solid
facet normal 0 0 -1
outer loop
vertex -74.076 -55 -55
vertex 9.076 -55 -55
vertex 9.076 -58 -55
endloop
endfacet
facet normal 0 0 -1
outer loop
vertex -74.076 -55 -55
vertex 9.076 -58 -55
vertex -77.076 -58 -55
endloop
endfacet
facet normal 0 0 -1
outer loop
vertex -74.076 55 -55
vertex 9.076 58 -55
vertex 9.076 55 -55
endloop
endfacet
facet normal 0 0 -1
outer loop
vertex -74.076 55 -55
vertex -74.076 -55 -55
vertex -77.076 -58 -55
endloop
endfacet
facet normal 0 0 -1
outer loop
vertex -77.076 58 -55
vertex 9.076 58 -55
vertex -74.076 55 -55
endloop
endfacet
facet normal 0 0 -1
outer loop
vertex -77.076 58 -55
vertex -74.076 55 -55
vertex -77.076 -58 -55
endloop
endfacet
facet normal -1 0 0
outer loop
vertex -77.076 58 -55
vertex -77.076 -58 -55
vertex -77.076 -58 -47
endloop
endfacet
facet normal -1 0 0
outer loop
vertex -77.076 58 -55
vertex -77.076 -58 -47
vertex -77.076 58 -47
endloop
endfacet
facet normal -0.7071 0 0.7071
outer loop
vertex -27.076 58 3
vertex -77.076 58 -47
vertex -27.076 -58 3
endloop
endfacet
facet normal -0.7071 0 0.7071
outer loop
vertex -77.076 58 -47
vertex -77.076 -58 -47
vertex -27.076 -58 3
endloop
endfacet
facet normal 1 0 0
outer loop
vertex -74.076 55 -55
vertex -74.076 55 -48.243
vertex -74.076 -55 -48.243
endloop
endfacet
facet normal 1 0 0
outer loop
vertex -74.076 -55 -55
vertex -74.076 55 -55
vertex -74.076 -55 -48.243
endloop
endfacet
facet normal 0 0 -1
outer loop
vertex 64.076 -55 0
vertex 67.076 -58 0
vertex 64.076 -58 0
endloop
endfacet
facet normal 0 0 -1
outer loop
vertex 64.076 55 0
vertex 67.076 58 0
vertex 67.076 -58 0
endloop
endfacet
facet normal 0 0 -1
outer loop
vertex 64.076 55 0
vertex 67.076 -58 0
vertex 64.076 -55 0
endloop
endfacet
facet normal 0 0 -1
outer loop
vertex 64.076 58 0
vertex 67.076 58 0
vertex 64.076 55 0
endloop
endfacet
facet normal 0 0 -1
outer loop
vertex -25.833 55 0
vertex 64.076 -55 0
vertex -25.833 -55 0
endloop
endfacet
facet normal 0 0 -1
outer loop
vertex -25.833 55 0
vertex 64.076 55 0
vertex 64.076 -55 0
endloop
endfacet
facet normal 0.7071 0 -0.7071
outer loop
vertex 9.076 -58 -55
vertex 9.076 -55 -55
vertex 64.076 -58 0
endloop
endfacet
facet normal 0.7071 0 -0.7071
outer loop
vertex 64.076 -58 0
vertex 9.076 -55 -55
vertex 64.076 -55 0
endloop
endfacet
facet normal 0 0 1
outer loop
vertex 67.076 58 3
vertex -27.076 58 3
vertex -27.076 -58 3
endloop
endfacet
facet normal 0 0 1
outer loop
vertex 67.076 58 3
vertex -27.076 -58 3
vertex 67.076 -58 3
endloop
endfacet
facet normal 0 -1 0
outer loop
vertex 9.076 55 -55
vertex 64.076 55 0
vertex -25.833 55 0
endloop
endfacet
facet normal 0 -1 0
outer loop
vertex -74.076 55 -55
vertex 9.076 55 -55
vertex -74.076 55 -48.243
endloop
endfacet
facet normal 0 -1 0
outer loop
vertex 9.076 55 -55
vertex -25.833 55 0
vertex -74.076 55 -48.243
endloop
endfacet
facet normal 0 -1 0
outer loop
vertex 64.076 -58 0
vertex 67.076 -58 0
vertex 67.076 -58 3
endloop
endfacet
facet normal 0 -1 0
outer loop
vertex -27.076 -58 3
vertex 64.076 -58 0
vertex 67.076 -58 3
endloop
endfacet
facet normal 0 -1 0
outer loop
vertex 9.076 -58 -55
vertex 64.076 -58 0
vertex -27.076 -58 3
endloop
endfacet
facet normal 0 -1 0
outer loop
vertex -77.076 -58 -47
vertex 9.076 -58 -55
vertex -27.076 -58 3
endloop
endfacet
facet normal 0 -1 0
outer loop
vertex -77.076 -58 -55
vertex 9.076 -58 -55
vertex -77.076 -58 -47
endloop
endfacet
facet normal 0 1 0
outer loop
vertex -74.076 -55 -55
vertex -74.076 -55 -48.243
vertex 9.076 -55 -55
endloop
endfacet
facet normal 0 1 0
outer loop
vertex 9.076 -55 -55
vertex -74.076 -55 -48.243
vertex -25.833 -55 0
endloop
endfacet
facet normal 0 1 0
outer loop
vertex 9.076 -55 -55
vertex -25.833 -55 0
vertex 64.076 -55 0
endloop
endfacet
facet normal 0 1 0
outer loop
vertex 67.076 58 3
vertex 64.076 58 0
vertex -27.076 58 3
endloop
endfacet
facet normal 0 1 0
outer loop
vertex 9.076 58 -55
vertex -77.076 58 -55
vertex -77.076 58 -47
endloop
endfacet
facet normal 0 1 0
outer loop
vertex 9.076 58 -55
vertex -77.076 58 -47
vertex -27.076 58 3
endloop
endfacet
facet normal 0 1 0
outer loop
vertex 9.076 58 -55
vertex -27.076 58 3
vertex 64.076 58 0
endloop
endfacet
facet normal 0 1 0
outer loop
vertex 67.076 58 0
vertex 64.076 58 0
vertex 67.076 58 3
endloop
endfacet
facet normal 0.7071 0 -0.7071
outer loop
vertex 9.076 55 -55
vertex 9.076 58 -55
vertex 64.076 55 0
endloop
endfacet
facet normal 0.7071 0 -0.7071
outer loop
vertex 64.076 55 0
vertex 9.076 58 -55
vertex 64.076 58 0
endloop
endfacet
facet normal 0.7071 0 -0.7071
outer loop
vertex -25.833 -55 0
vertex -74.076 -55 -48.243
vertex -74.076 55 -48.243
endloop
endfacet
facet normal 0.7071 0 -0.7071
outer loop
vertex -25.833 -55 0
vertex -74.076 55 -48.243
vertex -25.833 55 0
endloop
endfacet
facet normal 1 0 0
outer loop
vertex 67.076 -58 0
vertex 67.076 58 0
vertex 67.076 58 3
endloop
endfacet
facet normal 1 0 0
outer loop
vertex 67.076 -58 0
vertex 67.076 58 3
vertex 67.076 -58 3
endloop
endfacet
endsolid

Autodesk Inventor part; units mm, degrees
ref_plane "YZ Plane" through (0, 0, 0) normal (1, 0, 0) x (0, 1, 0)
ref_plane "XZ Plane" through (0, 0, 0) normal (0, 1, 0) x (-1, 0, 0)
sketch "Эскиз1" plane through (0, 0, 0) normal (0, 0, 1) x (1, 0, 0)
  line L0 (-77.0756, -58) -> (-77.0756, 58) projected
  line L1 (-77.0756, 58) -> (67.0756, 58) projected
  line L2 (67.0756, 58) -> (67.0756, -58) projected
  line L3 (67.0756, -58) -> (-77.0756, -58) projected
  line L4 (-77.0756, -58) -> (-77.0756, 58) projected
  line L5 (9.0756, -58) -> (-77.0756, -58) projected
  line L6 (-77.0756, 58) -> (9.0756, 58) projected
  point P0 (0, 0)
extrude "Выдавливание1" add sketch "Эскиз1" along normal blind 3
sketch "Эскиз2" plane through (0, 0, 0) normal (0, 0, -1) x (-1, 0, 0)
  line L0 (-64.0756, 55) -> (74.0756, 55) projected
  line L1 (74.0756, 55) -> (74.0756, -55) projected
  line L2 (74.0756, -55) -> (-64.0756, -55) projected
  line L3 (-64.0756, -55) -> (-64.0756, 55) projected
  line L4 (77.0756, -58) -> (77.0756, 58) projected
  line L5 (77.0756, 58) -> (-67.0756, 58) projected
  line L6 (-67.0756, 58) -> (-67.0756, -58) projected
  line L7 (-67.0756, -58) -> (77.0756, -58) projected
  line L8 (-67.0756, -58) -> (-67.0756, 58) projected
  line L9 (-67.0756, 58) -> (77.0756, 58) projected
  line L10 (77.0756, 58) -> (77.0756, -58) projected
  line L11 (77.0756, -58) -> (-67.0756, -58) projected
  line L12 (-9.0756, 55) -> (74.0756, 55)
  line L13 (74.0756, 55) -> (74.0756, -55)
  line L14 (74.0756, -55) -> (-9.0756, -55)
  point P0 (0, 0)
  point P1 (68.51, 55)
  point P2 (68.51, -55)
ref_plane "РабПлоскость1" through (-68.51, -58, -55) normal (0, 0, 1) x (1, 0, 0)
extrude "Выдавливание2" add sketch "Эскиз2" along normal up to surface (55 mm away)
chamfer "Фаска1" distance 50 angle 45 1 edges at (-77.0756, 0, 3)
sketch "Эскиз4" plane through (-27.7928, -58, 2.2828) normal (-0.7071068, 0, 0.7071068) x (0.7071068, 0, 0.7071068)
  line L0 (-3.2284, 3) -> (-65.4538, 3) projected
  line L1 (-65.4538, 3) -> (-65.4538, 113) projected
  line L2 (-65.4538, 113) -> (-3.2284, 113) projected
  line L3 (-3.2284, 113) -> (-3.2284, 3) projected
  line L4 (-69.6964, 0) -> (1.0143, 0) projected
  line L5 (1.0143, 0) -> (1.0143, 116) projected
  line L6 (1.0143, 116) -> (-69.6964, 116) projected
  line L7 (-69.6964, 116) -> (-69.6964, 0) projected
  point P0 (18.0383, 58)
extrude "Выдавливание4" add sketch "Эскиз4" against normal blind 3 contours L0 L1 L2 L3 | L7 L6 L5 L4
sketch "Эскиз9" plane through (-28.51, -58, 3) normal (-0.7071068, 0, 0.7071068) x (0.7071068, 0, 0.7071068)
  line L0 (-10, 105.175) -> (-30, 105.175)
  line L1 (-30, 105.175) -> (-30, 91.875)
  line L2 (-30, 91.875) -> (-10, 91.875)
  line L3 (-10, 91.875) -> (-10, 105.175)
  circle A0 centre (-43.2843, 98.525) radius 5.25
  line L4 (-7, 80.55) -> (-33, 80.55)
  line L5 (-33, 80.55) -> (-33, 35.45)
  line L6 (-33, 35.45) -> (-7, 35.45)
  line L7 (-7, 35.45) -> (-7, 80.55)
  line L8 (-33.5, 34.95) -> (-33.5, 81.05)
  line L9 (-33.5, 81.05) -> (-6.5, 81.05)
  line L10 (-6.5, 81.05) -> (-6.5, 34.95)
  line L11 (-6.5, 34.95) -> (-33.5, 34.95)
  line L12 (-6.5, 70.5) -> (-33.5, 70.5)
  line L13 (-33.5, 70.5) -> (-33.5, 45.5)
  line L14 (-33.5, 45.5) -> (-6.5, 45.5)
  line L15 (-6.5, 45.5) -> (-6.5, 70.5)
  line L16 (-6.5, 70.5) -> (-6, 70.5)
  line L17 (-6, 70.5) -> (-6, 45.5)
  line L18 (-6, 45.5) -> (-6.5, 45.5)
  line L19 (-6.5, 45.5) -> (-6.5, 70.5)
  line L20 (-33.5, 70.5) -> (-34, 70.5)
  line L21 (-34, 70.5) -> (-34, 45.5)
  line L22 (-34, 45.5) -> (-33.5, 45.5)
  line L23 (-33.5, 45.5) -> (-33.5, 70.5)
  line L24 (0, 0) -> (0, 116) projected
  line L25 (0, 116) -> (0, 0)
  line L26 (0, 0) -> (0, 58)
  line L27 (0, 58) -> (-56.5685, 58)
  line L28 (-56.5685, 116) -> (-56.5685, 0) projected
  circle A1 centre (-15.7843, 17.475) radius 3.65
  circle A2 centre (-40.7843, 17.475) radius 3.65
  line L29 (-6.5, 34.95) -> (-6.5, 0)
  line L30 (-56.5685, 0) -> (0, 0) projected
  line L31 (-6.5, 17.475) -> (-56.5685, 17.475)
  line L32 (-56.5685, 17.475) -> (0, 17.475)
  line L33 (-15.7843, 17.475) -> (-40.7843, 17.475)
  circle A3 centre (-45.0343, 73.55) radius 4.15
  line L34 (-56.5685, 81.05) -> (-33.5, 81.05)
  line L35 (-33.5, 81.05) -> (-33.5, 34.95)
  line L36 (-33.5, 34.95) -> (-56.5685, 34.95)
  line L37 (-56.5685, 34.95) -> (-56.5685, 81.05)
  line L38 (-45.0343, 81.05) -> (-45.0343, 34.95)
  circle A4 centre (-45.0343, 73.55) radius 7.5
  line L39 (-6.5, 81.05) -> (-6.5, 116)
  line L40 (-6.5, 98.525) -> (-56.5685, 98.525)
  line L41 (-56.5685, 98.525) -> (0, 98.525)
  line L42 (-30, 98.525) -> (-56.5685, 98.525)
  line L43 (-20, 91.875) -> (-20, 0)
  point P0 (18.0383, 58)
  point P1 (-6.5, 58)
  point P2 (-6.5, 58)
  point P3 (-28.2843, 17.475)
  point P4 (-10, 98.525)
  point P5 (-20, 81.05)
  dimension "d31" = 20
  dimension "d32" = 13.3
  dimension "d33" = 10.5
  dimension "d34" = 26
  dimension "d35" = 45.1
  dimension "d36" = 0.5
  dimension "d37" = 25
  dimension "d38" = 0.5
  dimension "d39" = 0.5
  dimension "d40" = 7.3
  dimension "d41" = 7.3
  dimension "d45" = 25
  dimension "d46" = 8.3
  dimension "d47" = 15
  dimension "d48" = 10
sketch "Эскиз10" plane through (-28.51, -58, 3) normal (-0.7071068, 0, 0.7071068) x (0.7071068, 0, 0.7071068)
  line L0 (-30, 105.175) -> (-30, 91.875) projected
  line L1 (-10, 105.175) -> (-30, 105.175) projected
  line L2 (-30, 91.875) -> (-10, 91.875) projected
  line L3 (-10, 91.875) -> (-10, 105.175) projected
  circle A0 centre (-43.2843, 98.525) radius 5.25 projected
  circle A1 centre (-45.0343, 73.55) radius 4.15 projected
  circle A2 centre (-40.7843, 17.475) radius 3.65 projected
  circle A3 centre (-15.7843, 17.475) radius 3.65 projected
  line L4 (-6.5, 34.95) -> (-33.5, 34.95) projected
  line L5 (-33.5, 34.95) -> (-33.5, 81.05) projected
  line L6 (-34, 70.5) -> (-34, 45.5) projected
  line L7 (-33.5, 81.05) -> (-6.5, 81.05) projected
  line L8 (-6.5, 81.05) -> (-6.5, 34.95) projected
  line L9 (-6.5, 70.5) -> (-6, 70.5) projected
  line L10 (-6, 70.5) -> (-6, 45.5) projected
  line L11 (-6, 45.5) -> (-6.5, 45.5) projected
  line L12 (-33.5, 70.5) -> (-34, 70.5) projected
  line L13 (-34, 45.5) -> (-33.5, 45.5) projected
  line L14 (-6.15, 69.35) -> (-6.15, 60.2) projected
  point P0 (18.0383, 58)
extrude "Выдавливание9" [suppressed]
sketch "Эскиз11" plane through (-25.6715, -58, 0.1615) normal (0.7071068, 0, -0.7071068) x (-0.7071068, 0, -0.7071068)
  line L0 (0.2284, 3) -> (0.2284, 113) projected
  line L1 (40.7843, 17.475) -> (40.7843, 25.8116)
  line L2 (38.9594, 25.1915) -> (38.9372, 24.9384) projected
  arc A0 (38.8018, 24.8228) -> (38.9372, 24.9384) centre (38.8107, 24.9495) ccw projected
  arc A1 (38.8018, 24.8228) -> (37.7667, 24.8228) centre (38.2843, 17.475) ccw projected
  arc A2 (38.9594, 25.1915) -> (38.8419, 25.3292) centre (38.8329, 25.2026) ccw projected
  arc A3 (37.6313, 24.9384) -> (37.7667, 24.8228) centre (37.7578, 24.9495) ccw projected
  line L3 (37.6092, 25.1915) -> (37.6313, 24.9384) projected
  arc A4 (37.7267, 25.3292) -> (37.6092, 25.1915) centre (37.7357, 25.2026) ccw projected
  arc A5 (39.3003, 25.2832) -> (37.2683, 25.2832) centre (38.2843, 17.475) ccw projected
  arc A6 (40.1771, 26.0275) -> (39.4118, 25.1305) centre (40.2357, 25.2026) ccw
  line L4 (39.4118, 25.1305) -> (39.434, 24.8774)
  arc A7 (39.434, 24.8774) -> (40.3159, 24.1245) centre (40.2578, 24.9495) ccw
  arc A8 (41.2526, 24.1245) -> (40.3159, 24.1245) centre (40.7843, 17.475) ccw
  arc A9 (41.2526, 24.1245) -> (42.1346, 24.8774) centre (41.3107, 24.9495) ccw
  line L5 (42.1346, 24.8774) -> (42.1567, 25.1305)
  arc A10 (42.1567, 25.1305) -> (41.3914, 26.0275) centre (41.3329, 25.2026) ccw
  circle A11 centre (40.7843, 17.475) radius 8.574
  arc A12 (-9.3529, 50.5788) -> (-10.2349, 51.3317) centre (-10.1768, 50.5067) ccw
  arc A13 (-11.1715, 51.3317) -> (-10.2349, 51.3317) centre (-10.7032, 57.9812) ccw
  arc A14 (-11.1715, 51.3317) -> (-12.0535, 50.5788) centre (-11.2297, 50.5067) ccw
  arc A15 (-12.0756, 50.3258) -> (-11.3104, 49.4288) centre (-11.2518, 50.2537) ccw
  arc A16 (-10.0961, 49.4288) -> (-9.3308, 50.3258) centre (-10.1546, 50.2537) ccw
  line L6 (-9.3308, 50.3258) -> (-9.3529, 50.5788)
  line L7 (-12.0535, 50.5788) -> (-12.0756, 50.3258)
  circle A17 centre (15.7843, 17.475) radius 8.574
  arc A18 (14.4118, 9.8195) -> (15.1771, 8.9225) centre (15.2357, 9.7474) ccw
  arc A19 (15.3159, 10.8255) -> (14.434, 10.0726) centre (15.2578, 10.0005) ccw
  line L8 (14.434, 10.0726) -> (14.4118, 9.8195)
  arc A20 (15.3159, 10.8255) -> (16.2526, 10.8255) centre (15.7843, 17.475) ccw
  arc A21 (17.1346, 10.0726) -> (16.2526, 10.8255) centre (16.3107, 10.0005) ccw
  arc A22 (16.3914, 8.9225) -> (17.1567, 9.8195) centre (16.3329, 9.7474) ccw
  line L9 (17.1567, 9.8195) -> (17.1346, 10.0726)
  line L10 (0.2284, 113) -> (68.4538, 113) projected
  line L11 (68.4538, 3) -> (0.2284, 3) projected
  line L12 (68.4538, 113) -> (68.4538, 3) projected
  point P0 (-18.0383, 58)
  point P1 (40.1771, 26.0275)
  point P2 (15.1771, 8.9225)
  point P3 (16.3914, 8.9225)
  point P4 (15.1771, 8.9225)
  point P5 (16.3914, 8.9225)
  point P6 (17.1346, 10.0726)
extrude "Выдавливание10" [suppressed]
sketch "Эскиз14" plane through (-65.51, -55, -55) normal (1, 0, 0) x (0, 0, -1)
  line L0 (-55, 0) -> (-55, 110) projected
  line L1 (-24.0346, 70.55) -> (-16.7574, 70.55)
  line L2 (-16.7574, 110) -> (-16.7574, 0) projected
  line L3 (-18.0074, 65.55) -> (-15.5074, 65.55)
  line L4 (-15.5074, 65.55) -> (-15.5074, 75.55)
  line L5 (-15.5074, 75.55) -> (-18.0074, 75.55)
  line L6 (-18.0074, 75.55) -> (-18.0074, 65.55)
  line L7 (-18.0074, 65.55) -> (-15.5074, 75.55) construction
  line L8 (-15.5074, 65.55) -> (-18.0074, 75.55) construction
  line L9 (-55, 110) -> (-6.7574, 110) projected
  line L10 (-6.7574, 0) -> (-55, 0) projected
  line L11 (-6.7574, 110) -> (-6.7574, 0) projected
  point P0 (-55, 55)
  dimension "d63" = 2.5
  dimension "d64" = 10
extrude "Выдавливание13" [suppressed]
ref_plane "РабПлоскость2" through (-65.51, 15.55, -39.4926) normal (0, -1, 0) x (1, 0, 0)
sketch "Эскиз15" plane through (-77.0756, 58, -55) normal (0, 1, 0) x (1, 0, 0)
  line L0 (86.1512, 0) -> (141.1512, -55) projected
  line L1 (144.1512, -55) -> (141.1512, -55) projected
  line L2 (0, 0) -> (86.1512, 0) projected
  line L3 (50, -58) -> (0, -8) projected
  line L4 (144.1512, -58) -> (50, -58) projected
  line L5 (144.1512, 0) -> (144.1512, -58) projected
  line L6 (0, 0) -> (144.1512, 0) projected
  line L7 (0, 0) -> (0, -8) projected
  point P0 (77.0756, -55)
extrude "Выдавливание14" cut sketch "Эскиз15" against normal up to surface (116 mm away) contours L6 L5 L1 L0
properties part number "LPS_cap"
